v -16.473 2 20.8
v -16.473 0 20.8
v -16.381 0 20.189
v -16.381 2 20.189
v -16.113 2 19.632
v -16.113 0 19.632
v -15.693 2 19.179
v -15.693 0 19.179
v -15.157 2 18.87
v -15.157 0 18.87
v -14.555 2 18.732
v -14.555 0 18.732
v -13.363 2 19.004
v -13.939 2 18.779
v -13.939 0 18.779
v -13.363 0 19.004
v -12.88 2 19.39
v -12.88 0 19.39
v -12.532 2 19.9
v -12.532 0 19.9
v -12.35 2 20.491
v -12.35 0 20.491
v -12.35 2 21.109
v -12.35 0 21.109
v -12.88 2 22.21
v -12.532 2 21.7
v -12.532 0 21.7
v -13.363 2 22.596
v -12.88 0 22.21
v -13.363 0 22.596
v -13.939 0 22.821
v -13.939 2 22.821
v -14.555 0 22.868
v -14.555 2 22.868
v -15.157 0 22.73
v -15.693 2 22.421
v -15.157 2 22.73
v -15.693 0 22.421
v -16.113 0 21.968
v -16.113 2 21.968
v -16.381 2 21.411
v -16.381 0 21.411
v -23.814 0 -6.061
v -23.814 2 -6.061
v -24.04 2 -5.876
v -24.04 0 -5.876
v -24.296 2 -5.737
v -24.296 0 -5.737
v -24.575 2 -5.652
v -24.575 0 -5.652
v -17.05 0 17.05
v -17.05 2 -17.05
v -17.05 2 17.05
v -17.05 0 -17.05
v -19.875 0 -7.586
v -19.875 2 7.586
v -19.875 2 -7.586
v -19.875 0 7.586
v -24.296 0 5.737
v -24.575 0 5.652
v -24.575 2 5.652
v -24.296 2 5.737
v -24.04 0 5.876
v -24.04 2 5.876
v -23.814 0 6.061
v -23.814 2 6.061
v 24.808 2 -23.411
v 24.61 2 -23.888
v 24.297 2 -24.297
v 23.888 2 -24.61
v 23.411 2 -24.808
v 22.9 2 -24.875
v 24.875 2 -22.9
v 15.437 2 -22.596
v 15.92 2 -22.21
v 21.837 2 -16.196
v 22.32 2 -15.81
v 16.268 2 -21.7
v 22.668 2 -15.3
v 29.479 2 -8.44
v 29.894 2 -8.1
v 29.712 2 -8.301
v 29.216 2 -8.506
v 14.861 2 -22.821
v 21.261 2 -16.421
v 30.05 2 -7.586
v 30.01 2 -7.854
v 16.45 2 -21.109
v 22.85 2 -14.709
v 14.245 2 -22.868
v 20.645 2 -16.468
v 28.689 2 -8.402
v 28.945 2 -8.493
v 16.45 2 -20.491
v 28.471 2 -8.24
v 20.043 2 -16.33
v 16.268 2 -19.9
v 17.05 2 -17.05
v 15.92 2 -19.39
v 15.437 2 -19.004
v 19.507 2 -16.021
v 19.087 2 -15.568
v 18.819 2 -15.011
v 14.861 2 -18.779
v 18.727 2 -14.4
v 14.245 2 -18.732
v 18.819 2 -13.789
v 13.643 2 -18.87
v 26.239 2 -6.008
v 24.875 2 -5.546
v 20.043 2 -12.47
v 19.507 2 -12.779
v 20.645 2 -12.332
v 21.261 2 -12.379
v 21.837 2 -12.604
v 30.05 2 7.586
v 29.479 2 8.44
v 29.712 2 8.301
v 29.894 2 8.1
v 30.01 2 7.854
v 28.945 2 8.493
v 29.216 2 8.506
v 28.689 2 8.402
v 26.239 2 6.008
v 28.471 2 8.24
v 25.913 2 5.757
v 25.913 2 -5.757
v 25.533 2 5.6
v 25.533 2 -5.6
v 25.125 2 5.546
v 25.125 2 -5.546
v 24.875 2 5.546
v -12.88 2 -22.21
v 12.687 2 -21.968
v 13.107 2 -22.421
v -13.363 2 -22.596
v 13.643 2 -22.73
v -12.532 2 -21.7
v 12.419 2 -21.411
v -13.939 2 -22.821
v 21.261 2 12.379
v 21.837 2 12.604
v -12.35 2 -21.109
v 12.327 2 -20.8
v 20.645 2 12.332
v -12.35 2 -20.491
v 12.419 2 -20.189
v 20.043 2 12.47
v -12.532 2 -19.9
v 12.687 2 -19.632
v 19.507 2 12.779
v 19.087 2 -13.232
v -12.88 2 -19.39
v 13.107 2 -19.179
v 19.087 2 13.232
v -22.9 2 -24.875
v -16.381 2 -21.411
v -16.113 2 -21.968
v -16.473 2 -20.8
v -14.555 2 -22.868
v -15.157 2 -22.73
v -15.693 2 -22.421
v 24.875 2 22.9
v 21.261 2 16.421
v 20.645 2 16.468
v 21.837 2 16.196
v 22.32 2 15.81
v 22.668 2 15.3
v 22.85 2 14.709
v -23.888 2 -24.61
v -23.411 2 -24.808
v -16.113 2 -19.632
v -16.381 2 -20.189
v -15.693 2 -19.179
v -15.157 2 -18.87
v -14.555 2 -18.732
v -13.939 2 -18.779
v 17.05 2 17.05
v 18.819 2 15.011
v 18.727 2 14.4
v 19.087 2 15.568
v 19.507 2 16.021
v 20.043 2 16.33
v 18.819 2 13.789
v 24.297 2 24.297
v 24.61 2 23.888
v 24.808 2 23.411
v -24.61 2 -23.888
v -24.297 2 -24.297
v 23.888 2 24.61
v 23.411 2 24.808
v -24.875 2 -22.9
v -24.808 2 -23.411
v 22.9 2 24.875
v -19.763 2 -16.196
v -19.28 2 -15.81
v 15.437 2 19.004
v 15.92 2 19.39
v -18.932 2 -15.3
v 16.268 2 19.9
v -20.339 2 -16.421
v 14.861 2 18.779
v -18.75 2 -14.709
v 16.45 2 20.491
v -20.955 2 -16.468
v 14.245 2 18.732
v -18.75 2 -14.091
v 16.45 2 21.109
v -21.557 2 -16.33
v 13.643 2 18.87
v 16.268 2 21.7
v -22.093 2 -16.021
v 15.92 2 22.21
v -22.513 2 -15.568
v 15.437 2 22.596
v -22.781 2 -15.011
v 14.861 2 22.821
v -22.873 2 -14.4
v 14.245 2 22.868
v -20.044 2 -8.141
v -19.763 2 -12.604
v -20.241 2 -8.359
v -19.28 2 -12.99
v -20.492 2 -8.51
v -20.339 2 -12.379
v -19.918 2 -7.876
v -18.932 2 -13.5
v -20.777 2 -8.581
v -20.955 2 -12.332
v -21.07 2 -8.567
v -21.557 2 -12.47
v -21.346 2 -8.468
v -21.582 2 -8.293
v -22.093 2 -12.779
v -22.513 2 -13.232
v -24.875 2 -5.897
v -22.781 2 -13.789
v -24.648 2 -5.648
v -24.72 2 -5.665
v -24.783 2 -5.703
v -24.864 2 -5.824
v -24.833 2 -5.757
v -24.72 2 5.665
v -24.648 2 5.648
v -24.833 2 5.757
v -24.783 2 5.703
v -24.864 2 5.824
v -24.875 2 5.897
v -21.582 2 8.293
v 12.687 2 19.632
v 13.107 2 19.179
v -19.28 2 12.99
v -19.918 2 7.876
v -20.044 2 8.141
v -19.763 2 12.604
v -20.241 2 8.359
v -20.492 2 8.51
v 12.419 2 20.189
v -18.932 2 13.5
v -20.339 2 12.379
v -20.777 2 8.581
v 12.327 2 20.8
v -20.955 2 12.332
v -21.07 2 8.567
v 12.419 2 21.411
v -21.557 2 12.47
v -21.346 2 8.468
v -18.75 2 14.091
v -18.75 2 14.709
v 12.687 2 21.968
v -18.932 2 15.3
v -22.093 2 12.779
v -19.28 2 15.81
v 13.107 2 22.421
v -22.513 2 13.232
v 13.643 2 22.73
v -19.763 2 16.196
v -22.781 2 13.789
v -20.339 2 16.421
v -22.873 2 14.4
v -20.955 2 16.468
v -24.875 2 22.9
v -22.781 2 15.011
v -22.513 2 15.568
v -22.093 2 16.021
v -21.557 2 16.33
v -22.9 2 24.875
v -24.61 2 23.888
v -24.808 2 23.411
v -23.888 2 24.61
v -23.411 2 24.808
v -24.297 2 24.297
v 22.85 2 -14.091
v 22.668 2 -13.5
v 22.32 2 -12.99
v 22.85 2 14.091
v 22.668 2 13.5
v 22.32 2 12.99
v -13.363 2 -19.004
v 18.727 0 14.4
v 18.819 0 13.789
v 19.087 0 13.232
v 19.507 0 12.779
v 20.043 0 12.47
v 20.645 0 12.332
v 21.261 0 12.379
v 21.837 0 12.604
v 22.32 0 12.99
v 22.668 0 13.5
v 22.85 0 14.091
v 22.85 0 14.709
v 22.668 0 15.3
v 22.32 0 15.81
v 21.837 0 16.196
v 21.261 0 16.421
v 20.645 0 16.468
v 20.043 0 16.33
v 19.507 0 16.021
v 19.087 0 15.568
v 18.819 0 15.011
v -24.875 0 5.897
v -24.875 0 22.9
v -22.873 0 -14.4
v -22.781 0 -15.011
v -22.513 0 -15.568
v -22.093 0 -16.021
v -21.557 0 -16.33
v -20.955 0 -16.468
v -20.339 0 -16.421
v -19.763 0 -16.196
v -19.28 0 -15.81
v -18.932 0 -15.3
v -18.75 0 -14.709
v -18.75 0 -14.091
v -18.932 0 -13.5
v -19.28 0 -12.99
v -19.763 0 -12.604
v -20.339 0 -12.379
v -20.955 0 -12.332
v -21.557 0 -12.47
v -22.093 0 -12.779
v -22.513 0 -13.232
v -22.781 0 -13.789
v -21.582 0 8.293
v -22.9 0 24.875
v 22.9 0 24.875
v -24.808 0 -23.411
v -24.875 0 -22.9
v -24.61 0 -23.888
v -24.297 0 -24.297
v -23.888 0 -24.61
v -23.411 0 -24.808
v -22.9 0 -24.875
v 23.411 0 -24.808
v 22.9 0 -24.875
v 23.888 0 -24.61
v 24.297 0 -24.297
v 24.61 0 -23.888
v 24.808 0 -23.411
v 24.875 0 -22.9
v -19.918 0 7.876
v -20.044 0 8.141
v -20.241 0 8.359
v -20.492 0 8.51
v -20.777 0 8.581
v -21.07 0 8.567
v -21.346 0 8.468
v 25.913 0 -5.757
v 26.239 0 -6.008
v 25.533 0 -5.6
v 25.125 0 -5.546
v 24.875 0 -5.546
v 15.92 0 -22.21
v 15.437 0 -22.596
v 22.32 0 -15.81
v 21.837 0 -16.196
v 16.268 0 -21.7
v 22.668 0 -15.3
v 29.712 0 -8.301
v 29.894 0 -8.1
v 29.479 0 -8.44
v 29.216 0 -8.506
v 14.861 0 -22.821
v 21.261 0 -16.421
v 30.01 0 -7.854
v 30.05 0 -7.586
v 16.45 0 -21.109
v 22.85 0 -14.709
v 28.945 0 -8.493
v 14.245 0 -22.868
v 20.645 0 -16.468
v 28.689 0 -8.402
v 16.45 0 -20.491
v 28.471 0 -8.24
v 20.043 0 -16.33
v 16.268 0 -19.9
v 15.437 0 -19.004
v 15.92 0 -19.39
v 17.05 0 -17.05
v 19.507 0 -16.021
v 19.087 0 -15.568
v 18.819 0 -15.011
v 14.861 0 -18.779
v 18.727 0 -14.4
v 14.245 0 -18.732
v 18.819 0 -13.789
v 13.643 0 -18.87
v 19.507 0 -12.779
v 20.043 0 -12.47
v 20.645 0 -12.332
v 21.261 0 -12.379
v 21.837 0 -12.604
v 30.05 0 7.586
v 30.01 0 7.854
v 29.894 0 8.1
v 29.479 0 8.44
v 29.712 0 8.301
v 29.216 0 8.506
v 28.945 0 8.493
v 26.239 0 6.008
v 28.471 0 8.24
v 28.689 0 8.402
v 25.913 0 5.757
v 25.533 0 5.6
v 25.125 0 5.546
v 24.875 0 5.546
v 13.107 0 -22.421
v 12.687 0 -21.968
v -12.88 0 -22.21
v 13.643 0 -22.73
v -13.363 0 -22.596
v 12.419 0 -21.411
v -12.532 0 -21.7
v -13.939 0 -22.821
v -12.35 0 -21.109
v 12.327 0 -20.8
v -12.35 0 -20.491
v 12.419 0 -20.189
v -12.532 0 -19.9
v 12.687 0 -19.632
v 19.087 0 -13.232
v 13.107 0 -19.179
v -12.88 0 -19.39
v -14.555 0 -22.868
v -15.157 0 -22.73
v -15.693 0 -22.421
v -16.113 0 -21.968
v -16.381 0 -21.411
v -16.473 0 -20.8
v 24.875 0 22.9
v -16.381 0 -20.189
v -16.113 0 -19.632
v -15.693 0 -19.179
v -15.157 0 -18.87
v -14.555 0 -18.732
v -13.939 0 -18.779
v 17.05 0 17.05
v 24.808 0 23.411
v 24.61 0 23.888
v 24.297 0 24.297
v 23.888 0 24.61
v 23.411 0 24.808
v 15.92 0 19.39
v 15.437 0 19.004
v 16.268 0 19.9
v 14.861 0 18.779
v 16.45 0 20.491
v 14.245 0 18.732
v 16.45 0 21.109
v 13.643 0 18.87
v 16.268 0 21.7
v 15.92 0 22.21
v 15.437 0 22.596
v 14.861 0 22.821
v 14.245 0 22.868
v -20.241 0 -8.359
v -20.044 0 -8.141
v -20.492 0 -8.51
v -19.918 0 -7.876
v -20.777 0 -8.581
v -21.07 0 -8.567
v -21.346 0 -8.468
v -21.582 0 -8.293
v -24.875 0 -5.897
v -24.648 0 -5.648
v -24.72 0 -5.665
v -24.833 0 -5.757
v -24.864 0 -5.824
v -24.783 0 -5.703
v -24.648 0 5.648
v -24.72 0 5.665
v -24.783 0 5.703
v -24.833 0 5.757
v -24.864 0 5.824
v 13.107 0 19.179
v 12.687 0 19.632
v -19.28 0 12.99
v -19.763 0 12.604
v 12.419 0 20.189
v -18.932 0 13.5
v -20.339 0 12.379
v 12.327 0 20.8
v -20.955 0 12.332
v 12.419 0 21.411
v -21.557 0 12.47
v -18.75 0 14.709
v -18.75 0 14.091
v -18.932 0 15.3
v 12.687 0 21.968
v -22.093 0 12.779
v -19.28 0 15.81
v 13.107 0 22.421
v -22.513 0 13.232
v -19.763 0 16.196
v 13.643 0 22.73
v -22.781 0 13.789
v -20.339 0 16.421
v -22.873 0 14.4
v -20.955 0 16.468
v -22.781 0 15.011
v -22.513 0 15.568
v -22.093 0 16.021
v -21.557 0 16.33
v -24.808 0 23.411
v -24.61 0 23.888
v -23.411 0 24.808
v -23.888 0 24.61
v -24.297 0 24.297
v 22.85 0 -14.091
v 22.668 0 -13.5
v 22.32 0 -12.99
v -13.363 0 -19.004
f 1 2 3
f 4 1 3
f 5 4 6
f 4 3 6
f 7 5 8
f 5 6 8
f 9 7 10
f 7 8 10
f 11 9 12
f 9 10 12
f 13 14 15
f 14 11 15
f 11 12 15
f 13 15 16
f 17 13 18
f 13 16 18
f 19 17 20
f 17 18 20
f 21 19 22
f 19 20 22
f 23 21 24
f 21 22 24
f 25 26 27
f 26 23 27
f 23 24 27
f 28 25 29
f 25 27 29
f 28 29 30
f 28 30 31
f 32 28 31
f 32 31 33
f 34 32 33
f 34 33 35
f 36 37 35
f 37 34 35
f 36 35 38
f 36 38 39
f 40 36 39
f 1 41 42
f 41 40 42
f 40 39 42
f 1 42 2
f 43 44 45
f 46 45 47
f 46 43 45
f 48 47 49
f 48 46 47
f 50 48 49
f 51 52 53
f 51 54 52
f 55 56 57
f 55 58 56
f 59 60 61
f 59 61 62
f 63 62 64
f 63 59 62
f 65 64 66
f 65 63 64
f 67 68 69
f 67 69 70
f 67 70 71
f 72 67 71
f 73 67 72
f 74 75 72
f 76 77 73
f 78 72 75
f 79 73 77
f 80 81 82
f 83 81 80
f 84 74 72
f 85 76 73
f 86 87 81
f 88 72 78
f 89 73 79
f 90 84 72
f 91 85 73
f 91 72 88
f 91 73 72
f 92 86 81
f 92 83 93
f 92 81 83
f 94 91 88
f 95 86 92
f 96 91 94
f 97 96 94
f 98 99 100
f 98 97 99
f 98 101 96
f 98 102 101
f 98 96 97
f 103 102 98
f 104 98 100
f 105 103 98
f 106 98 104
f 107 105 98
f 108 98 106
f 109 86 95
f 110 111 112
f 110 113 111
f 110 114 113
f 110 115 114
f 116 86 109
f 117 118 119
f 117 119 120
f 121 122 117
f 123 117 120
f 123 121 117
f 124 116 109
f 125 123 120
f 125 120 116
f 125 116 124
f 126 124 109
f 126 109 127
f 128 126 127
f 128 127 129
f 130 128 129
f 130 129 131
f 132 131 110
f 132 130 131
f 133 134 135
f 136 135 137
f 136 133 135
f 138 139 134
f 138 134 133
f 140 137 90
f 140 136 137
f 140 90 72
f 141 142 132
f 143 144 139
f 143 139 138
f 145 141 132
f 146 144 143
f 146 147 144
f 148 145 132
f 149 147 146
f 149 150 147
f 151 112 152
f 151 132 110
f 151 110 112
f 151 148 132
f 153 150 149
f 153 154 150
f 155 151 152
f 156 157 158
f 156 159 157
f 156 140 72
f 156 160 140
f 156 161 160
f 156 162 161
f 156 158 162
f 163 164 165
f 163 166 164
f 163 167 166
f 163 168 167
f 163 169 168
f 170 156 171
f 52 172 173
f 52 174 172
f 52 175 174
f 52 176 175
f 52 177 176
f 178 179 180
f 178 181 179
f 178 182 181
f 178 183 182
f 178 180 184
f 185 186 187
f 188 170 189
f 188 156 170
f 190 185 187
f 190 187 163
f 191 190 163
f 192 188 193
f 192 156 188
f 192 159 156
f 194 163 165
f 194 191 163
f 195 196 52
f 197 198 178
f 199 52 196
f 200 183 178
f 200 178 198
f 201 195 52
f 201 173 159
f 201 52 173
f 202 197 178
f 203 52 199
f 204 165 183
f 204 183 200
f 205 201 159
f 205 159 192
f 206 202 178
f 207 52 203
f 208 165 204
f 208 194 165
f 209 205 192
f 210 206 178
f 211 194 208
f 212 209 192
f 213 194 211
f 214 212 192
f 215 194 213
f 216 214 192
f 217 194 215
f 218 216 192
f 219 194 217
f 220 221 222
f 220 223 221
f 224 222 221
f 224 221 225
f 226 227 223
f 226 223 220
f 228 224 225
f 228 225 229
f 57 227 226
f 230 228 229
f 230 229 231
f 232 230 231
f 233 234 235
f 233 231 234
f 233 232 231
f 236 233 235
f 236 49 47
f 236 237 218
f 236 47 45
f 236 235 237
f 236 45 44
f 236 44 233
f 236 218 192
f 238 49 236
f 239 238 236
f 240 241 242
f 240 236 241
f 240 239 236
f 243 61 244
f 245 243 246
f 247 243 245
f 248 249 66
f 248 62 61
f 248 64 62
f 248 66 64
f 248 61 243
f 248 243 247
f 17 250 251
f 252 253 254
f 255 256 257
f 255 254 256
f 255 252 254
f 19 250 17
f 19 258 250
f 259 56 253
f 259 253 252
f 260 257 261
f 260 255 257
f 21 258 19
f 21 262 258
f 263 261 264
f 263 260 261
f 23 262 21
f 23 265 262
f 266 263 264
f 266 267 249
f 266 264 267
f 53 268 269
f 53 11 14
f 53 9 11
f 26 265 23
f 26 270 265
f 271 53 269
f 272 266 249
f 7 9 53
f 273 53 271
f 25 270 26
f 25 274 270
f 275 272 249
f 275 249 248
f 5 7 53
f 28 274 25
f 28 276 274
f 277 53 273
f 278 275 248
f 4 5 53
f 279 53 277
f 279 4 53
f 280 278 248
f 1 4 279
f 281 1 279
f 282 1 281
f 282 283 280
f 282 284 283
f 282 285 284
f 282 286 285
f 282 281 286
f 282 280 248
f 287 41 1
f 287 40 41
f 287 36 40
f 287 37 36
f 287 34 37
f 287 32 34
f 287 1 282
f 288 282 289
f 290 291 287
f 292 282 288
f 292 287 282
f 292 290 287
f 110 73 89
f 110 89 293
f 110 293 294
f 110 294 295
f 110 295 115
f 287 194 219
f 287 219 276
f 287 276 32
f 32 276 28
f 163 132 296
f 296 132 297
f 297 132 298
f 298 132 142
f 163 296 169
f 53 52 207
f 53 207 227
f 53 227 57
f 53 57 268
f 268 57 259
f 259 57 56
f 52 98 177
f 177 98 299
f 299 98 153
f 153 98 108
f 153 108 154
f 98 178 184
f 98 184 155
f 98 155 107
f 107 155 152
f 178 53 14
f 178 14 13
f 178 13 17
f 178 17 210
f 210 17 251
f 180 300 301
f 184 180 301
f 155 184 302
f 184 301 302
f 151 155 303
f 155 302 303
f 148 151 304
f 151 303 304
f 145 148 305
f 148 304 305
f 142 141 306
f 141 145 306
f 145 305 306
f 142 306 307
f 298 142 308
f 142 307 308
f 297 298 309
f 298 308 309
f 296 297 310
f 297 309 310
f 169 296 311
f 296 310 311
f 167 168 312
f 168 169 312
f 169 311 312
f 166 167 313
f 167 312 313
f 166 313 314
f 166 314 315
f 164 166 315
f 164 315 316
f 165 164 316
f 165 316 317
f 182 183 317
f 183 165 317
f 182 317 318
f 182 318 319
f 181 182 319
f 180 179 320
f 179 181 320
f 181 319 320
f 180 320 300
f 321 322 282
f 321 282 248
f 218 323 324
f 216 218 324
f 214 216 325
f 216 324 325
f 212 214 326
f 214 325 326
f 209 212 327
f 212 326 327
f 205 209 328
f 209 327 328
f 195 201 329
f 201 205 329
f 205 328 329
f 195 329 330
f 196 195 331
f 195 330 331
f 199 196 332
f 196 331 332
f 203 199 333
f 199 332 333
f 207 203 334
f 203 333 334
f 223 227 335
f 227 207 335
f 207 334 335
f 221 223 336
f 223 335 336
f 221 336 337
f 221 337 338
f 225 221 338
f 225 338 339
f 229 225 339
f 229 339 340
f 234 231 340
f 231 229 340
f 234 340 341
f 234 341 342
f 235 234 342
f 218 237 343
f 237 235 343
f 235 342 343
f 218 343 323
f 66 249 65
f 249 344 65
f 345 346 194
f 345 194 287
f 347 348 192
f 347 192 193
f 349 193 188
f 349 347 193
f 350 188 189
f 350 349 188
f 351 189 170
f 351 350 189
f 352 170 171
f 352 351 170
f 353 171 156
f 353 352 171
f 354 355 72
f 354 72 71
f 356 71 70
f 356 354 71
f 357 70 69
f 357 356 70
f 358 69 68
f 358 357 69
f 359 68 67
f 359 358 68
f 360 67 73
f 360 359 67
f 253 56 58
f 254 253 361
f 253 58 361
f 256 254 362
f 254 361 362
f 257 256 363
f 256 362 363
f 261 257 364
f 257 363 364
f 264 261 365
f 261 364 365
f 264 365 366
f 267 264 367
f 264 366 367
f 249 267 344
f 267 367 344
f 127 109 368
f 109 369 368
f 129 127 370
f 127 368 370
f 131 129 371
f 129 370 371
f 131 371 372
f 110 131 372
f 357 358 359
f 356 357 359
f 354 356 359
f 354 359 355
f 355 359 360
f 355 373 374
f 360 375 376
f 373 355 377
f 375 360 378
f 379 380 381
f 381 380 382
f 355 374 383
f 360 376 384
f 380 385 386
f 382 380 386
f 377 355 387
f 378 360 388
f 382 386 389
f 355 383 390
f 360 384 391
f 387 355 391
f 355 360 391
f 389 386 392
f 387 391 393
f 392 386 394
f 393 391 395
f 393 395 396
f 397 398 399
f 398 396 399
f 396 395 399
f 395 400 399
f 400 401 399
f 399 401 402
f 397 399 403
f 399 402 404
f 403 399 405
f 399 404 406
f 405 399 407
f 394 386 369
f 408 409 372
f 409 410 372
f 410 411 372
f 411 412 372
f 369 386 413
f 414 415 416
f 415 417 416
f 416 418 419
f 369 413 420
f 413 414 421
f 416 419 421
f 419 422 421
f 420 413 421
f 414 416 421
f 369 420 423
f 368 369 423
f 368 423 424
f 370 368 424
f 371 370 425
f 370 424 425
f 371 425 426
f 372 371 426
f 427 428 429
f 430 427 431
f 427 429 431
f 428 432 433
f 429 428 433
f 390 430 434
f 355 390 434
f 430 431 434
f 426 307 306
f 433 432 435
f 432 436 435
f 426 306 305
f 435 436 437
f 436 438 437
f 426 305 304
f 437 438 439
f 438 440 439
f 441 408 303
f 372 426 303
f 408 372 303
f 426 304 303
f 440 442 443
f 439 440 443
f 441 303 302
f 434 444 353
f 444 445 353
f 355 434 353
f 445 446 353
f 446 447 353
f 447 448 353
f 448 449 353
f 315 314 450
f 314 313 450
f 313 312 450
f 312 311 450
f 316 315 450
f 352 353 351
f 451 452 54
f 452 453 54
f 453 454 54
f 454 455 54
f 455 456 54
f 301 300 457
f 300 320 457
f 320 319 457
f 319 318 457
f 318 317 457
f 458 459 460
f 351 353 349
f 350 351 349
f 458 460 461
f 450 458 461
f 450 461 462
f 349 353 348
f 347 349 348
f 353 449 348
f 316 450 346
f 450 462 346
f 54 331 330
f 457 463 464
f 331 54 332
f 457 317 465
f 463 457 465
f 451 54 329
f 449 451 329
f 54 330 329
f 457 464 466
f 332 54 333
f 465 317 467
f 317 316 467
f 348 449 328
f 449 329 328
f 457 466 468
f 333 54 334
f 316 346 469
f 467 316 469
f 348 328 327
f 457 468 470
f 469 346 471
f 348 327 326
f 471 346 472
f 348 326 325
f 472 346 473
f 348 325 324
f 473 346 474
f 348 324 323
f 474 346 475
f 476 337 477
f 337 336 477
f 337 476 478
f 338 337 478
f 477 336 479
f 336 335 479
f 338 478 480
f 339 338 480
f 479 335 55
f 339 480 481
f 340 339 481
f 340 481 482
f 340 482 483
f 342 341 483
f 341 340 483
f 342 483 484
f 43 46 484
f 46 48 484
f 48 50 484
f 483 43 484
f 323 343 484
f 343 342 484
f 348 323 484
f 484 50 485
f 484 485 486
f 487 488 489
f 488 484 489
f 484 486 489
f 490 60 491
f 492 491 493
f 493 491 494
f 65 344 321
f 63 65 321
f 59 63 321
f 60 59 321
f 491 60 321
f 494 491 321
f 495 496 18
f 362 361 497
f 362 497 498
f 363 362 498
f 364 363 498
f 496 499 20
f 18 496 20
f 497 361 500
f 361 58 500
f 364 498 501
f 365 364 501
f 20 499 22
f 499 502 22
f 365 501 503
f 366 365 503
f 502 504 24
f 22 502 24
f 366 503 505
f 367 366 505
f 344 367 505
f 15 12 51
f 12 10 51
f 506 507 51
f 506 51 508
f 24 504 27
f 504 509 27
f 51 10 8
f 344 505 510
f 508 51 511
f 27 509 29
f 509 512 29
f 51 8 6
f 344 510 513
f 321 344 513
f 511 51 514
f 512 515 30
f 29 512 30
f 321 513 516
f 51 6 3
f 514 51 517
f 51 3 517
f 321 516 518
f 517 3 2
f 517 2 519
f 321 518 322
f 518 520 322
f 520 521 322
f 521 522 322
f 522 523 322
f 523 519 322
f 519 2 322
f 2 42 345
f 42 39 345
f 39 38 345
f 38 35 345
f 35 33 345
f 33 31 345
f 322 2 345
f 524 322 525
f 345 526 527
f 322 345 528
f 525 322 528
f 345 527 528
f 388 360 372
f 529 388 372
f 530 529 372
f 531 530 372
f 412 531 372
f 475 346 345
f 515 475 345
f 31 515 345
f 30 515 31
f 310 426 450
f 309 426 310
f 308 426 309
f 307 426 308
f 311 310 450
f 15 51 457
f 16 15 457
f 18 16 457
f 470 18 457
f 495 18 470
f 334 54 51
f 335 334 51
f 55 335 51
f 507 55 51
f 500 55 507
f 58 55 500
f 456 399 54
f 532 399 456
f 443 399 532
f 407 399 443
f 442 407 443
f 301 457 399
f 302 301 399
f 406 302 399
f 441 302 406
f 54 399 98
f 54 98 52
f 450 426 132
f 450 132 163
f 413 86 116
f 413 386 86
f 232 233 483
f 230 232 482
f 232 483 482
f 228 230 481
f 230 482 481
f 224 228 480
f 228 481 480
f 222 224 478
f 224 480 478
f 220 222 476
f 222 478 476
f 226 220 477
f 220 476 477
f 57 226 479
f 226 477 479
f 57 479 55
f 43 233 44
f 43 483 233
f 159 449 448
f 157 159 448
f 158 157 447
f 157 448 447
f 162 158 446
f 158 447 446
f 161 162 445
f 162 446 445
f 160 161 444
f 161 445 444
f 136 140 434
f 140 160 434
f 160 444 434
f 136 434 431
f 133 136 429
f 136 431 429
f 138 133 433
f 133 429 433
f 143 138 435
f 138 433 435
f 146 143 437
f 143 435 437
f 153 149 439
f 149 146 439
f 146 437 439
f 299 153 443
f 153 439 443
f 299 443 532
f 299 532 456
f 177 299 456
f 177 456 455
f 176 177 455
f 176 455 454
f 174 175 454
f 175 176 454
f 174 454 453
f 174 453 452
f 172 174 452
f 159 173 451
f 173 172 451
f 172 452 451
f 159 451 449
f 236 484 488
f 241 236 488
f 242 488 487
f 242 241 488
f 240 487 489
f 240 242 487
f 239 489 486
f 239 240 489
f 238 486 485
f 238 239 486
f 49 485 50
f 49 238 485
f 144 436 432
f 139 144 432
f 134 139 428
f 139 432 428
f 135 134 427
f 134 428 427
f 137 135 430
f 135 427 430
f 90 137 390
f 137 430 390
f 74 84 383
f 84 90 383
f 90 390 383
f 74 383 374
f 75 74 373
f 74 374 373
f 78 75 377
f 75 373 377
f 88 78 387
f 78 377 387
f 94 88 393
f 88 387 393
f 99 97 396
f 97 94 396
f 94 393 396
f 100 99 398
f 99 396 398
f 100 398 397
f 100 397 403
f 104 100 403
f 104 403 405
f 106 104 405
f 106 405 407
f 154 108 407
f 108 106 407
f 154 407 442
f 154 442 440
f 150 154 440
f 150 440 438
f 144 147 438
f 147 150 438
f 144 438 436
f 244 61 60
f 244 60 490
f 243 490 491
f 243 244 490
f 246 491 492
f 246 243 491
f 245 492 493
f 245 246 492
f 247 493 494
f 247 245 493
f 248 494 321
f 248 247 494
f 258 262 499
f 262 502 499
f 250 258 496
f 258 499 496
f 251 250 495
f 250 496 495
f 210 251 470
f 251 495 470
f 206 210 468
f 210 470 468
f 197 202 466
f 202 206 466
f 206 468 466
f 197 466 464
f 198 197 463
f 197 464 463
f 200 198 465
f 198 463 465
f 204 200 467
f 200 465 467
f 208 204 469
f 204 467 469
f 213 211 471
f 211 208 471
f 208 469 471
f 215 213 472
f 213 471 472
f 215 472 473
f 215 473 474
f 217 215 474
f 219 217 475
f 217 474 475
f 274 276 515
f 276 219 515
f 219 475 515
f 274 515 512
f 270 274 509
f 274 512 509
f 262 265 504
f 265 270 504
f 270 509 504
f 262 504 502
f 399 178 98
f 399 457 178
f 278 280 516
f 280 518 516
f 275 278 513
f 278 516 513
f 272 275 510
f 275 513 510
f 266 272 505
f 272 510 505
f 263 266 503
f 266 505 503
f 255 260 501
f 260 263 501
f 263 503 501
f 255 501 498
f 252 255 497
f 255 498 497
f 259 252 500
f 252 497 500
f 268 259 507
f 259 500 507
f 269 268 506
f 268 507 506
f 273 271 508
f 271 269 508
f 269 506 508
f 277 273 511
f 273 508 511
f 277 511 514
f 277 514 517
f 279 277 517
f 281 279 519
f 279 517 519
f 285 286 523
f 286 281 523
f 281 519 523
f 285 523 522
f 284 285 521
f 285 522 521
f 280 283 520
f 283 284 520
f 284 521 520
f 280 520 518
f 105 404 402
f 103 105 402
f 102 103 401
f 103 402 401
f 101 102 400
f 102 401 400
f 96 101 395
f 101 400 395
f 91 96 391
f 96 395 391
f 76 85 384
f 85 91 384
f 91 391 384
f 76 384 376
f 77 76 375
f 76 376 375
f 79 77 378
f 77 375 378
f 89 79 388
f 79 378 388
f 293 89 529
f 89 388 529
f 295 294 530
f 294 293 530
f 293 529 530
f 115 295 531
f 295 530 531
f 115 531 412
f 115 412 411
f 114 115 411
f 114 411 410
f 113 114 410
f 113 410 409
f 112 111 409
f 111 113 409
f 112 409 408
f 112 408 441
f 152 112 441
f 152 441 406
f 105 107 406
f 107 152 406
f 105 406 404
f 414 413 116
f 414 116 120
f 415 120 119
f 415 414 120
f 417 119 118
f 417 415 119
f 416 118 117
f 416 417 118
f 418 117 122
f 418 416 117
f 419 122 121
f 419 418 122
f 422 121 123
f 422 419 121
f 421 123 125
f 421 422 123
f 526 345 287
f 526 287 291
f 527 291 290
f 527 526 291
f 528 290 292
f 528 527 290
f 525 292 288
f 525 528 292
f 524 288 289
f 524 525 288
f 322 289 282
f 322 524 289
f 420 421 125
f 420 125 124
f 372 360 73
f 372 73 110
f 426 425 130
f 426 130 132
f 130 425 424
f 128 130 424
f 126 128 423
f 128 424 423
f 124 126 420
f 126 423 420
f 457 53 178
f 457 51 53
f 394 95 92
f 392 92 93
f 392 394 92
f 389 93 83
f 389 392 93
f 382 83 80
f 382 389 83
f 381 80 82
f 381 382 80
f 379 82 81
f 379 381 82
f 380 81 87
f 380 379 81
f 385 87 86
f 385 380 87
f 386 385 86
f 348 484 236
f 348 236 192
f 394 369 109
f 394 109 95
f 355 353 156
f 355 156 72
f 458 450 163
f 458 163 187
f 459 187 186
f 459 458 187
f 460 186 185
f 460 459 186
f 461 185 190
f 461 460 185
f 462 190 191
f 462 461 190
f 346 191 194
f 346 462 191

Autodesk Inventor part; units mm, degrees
ref_plane "YZ Plane" through (0, 0, 0) normal (1, 0, 0) x (0, 1, 0)
ref_plane "XZ Plane" through (0, 0, 0) normal (0, 1, 0) x (-1, 0, 0)
ref_plane "XY Plane" through (0, 0, 0) normal (0, 0, 1) x (1, 0, 0)
sketch "Sketch1" plane through (0, 0, 0) normal (0, 1, 0) x (-1, 0, 0)
  circle A0 centre (-21.9, -21.9) radius 1.875 projected
  circle A1 centre (21.9, 21.9) radius 1.875 projected
  circle A2 centre (21.9, -21.9) radius 1.875 projected
  circle A3 centre (-21.9, 21.9) radius 1.875 projected
  circle A4 centre (14.4, 20.8) radius 2.0734 projected
  circle A5 centre (-14.4, -20.8) radius 2.0734 projected
  circle A6 centre (14.4, -20.8) radius 2.0734 projected
  circle A7 centre (20.8, -14.4) radius 2.0734 projected
  line L0 (-17.05, 17.05) -> (-17.05, -17.05) projected
  line L1 (17.05, 17.05) -> (-17.05, 17.05) projected
  line L2 (17.05, -17.05) -> (17.05, 17.05) projected
  line L3 (-17.05, -17.05) -> (17.05, -17.05) projected
  circle A8 centre (20.8, 14.4) radius 2.0734 projected
  circle A9 centre (-14.4, 20.8) radius 2.0734 projected
  circle A10 centre (-20.8, -14.4) radius 2.0734 projected
  circle A11 centre (-20.8, 14.4) radius 2.0734 projected
  line L4 (-22.9, 24.875) -> (22.9, 24.875) projected
  arc A12 (-22.9, 24.875) -> (-24.875, 22.9) centre (-22.9, 22.9) ccw projected
  line L5 (-24.875, -22.9) -> (-24.875, 22.9) projected
  arc A13 (-24.875, -22.9) -> (-22.9, -24.875) centre (-22.9, -22.9) ccw projected
  line L6 (22.9, -24.875) -> (-22.9, -24.875) projected
  arc A14 (22.9, -24.875) -> (24.875, -22.9) centre (22.9, -22.9) ccw projected
  line L7 (24.875, 22.9) -> (24.875, -22.9) projected
  arc A15 (24.875, 22.9) -> (22.9, 24.875) centre (22.9, 22.9) ccw projected
  arc A16 (24.9, 22.9) -> (22.9, 24.9) centre (22.9, 22.9) ccw projected
  line L8 (22.9, 24.9) -> (-22.9, 24.9) projected
  arc A17 (-22.9, 24.9) -> (-24.9, 22.9) centre (-22.9, 22.9) ccw projected
  line L9 (-24.9, 22.9) -> (-24.9, -22.9) projected
  arc A18 (-24.9, -22.9) -> (-22.9, -24.9) centre (-22.9, -22.9) ccw projected
  line L10 (-22.9, -24.9) -> (22.9, -24.9) projected
  arc A19 (22.9, -24.9) -> (24.9, -22.9) centre (22.9, -22.9) ccw projected
  line L11 (24.9, -22.9) -> (24.9, 22.9) projected
  point P0 (0, 0)
extrude "Extrusion1" add sketch "Sketch1" along normal blind 2 contours A0 | A1 | A2 | A3 | L4 A15 L7 A14 L6 A13 L5 A12
sketch "Sketch2" plane through (0, 0, 0) normal (0, 1, 0) x (-1, 0, 0)
  line L0 (-7.5858, -29.875) -> (7.5858, -29.875)
  line L1 (10, -29.875) -> (10, -19.875)
  line L2 (7.5858, -19.875) -> (-7.5858, -19.875)
  line L3 (-10, -19.875) -> (-10, -29.875)
  line L4 (-10, -29.875) -> (10, -19.875) construction
  line L5 (10, -29.875) -> (-10, -19.875) construction
  line L6 (-8.2929, -21.5821) -> (-6.0607, -23.8143)
  line L7 (-10, -19.875) -> (-6.8431, -19.875) construction
  line L8 (8.2929, -21.5821) -> (6.0607, -23.8143)
  line L9 (-8.2929, -28.1679) -> (-6.0607, -25.9357)
  line L10 (8.2929, -28.1679) -> (6.0607, -25.9357)
  arc A0 (-8.2929, -28.1679) -> (-7.5858, -29.875) centre (-7.5858, -28.875) ccw
  arc A1 (7.5858, -29.875) -> (8.2929, -28.1679) centre (7.5858, -28.875) ccw
  arc A2 (-6.0607, -25.9357) -> (-6.0607, -23.8143) centre (-7.1213, -24.875) ccw
  arc A3 (6.0607, -23.8143) -> (6.0607, -25.9357) centre (7.1213, -24.875) ccw
  arc A4 (-7.5858, -19.875) -> (-8.2929, -21.5821) centre (-7.5858, -20.875) ccw
  arc A5 (8.2929, -21.5821) -> (7.5858, -19.875) centre (7.5858, -20.875) ccw
  line L11 (-7.5858, -19.95) -> (7.5858, -19.95)
  arc A6 (8.2399, -21.5291) -> (7.5858, -19.95) centre (7.5858, -20.875) ccw
  line L12 (8.2399, -21.5291) -> (6.0076, -23.7613)
  arc A7 (6.0076, -23.7613) -> (6.0076, -25.9887) centre (7.1213, -24.875) ccw
  line L13 (6.0076, -25.9887) -> (8.2399, -28.2209)
  arc A8 (7.5858, -29.8) -> (8.2399, -28.2209) centre (7.5858, -28.875) ccw
  line L14 (7.5858, -29.8) -> (-7.5858, -29.8)
  arc A9 (-8.2399, -28.2209) -> (-7.5858, -29.8) centre (-7.5858, -28.875) ccw
  line L15 (-8.2399, -28.2209) -> (-6.0076, -25.9887)
  arc A10 (-6.0076, -25.9887) -> (-6.0076, -23.7613) centre (-7.1213, -24.875) ccw
  line L16 (-6.0076, -23.7613) -> (-8.2399, -21.5291)
  arc A11 (-7.5858, -19.95) -> (-8.2399, -21.5291) centre (-7.5858, -20.875) ccw
  line L17 (-8.2399, 21.7791) -> (-6.0076, 24.0113)
  line L18 (-7.5858, 30.05) -> (7.5858, 30.05)
  line L19 (7.5858, 20.2) -> (-7.5858, 20.2)
  line L20 (-7.5858, 20.125) -> (7.5858, 20.125)
  line L21 (7.5858, 30.125) -> (-7.5858, 30.125)
  line L22 (10, 20.125) -> (-10, 30.125) construction
  line L23 (-10, 20.125) -> (10, 30.125) construction
  arc A12 (-6.0076, 24.0113) -> (-6.0076, 26.2387) centre (-7.1213, 25.125) ccw
  arc A13 (-6.0607, 24.0643) -> (-6.0607, 26.1857) centre (-7.1213, 25.125) ccw
  arc A14 (-7.5858, 30.05) -> (-8.2399, 28.4709) centre (-7.5858, 29.125) ccw
  arc A15 (-7.5858, 30.125) -> (-8.2929, 28.4179) centre (-7.5858, 29.125) ccw
  line L24 (-8.2929, 28.4179) -> (-6.0607, 26.1857)
  line L25 (-10, 30.125) -> (-6.8431, 30.125) construction
  line L26 (-10, 30.125) -> (-10, 20.125)
  arc A16 (-8.2399, 21.7791) -> (-7.5858, 20.2) centre (-7.5858, 21.125) ccw
  arc A17 (-8.2929, 21.8321) -> (-7.5858, 20.125) centre (-7.5858, 21.125) ccw
  line L27 (-8.2929, 21.8321) -> (-6.0607, 24.0643)
  line L28 (-6.0076, 26.2387) -> (-8.2399, 28.4709)
  line L29 (10, 20.125) -> (10, 30.125)
  line L30 (8.2929, 28.4179) -> (6.0607, 26.1857)
  line L31 (8.2929, 21.8321) -> (6.0607, 24.0643)
  arc A18 (7.5858, 20.125) -> (8.2929, 21.8321) centre (7.5858, 21.125) ccw
  arc A19 (6.0076, 26.2387) -> (6.0076, 24.0113) centre (7.1213, 25.125) ccw
  arc A20 (6.0607, 26.1857) -> (6.0607, 24.0643) centre (7.1213, 25.125) ccw
  arc A21 (7.5858, 20.2) -> (8.2399, 21.7791) centre (7.5858, 21.125) ccw
  line L32 (6.0076, 24.0113) -> (8.2399, 21.7791)
  line L33 (8.2399, 28.4709) -> (6.0076, 26.2387)
  arc A22 (8.2929, 28.4179) -> (7.5858, 30.125) centre (7.5858, 29.125) ccw
  arc A23 (8.2399, 28.4709) -> (7.5858, 30.05) centre (7.5858, 29.125) ccw
  line L34 (0, 24.875) -> (0, 25.125)
  line L35 (-22.9, -24.875) -> (22.9, -24.875) projected
  line L36 (22.9, 24.875) -> (-22.9, 24.875) projected
  line L37 (0, -24.875) -> (0, -24.875)
  line L38 (5.6213, 25.125) -> (5.5463, 25.125)
  line L39 (5.5463, 25.125) -> (5.5463, 24.875)
  line L40 (5.5463, 24.875) -> (5.6213, 24.875)
  line L41 (5.6213, 24.875) -> (5.6213, 25.125)
  line L42 (-5.6213, 25.125) -> (-5.5463, 25.125)
  line L43 (-5.5463, 25.125) -> (-5.5463, 24.875)
  line L44 (-5.5463, 24.875) -> (-5.6213, 24.875)
  line L45 (-5.6213, 24.875) -> (-5.6213, 25.125)
  line L46 (-5.6213, -24.875) -> (-5.5463, -24.875)
  line L47 (-5.5463, -24.875) -> (-5.5463, -24.875)
  line L48 (-5.5463, -24.875) -> (-5.6213, -24.875)
  line L49 (-5.6213, -24.875) -> (-5.6213, -24.875)
  line L50 (5.6213, -24.875) -> (5.5463, -24.875)
  line L51 (5.5463, -24.875) -> (5.5463, -24.875)
  line L52 (5.5463, -24.875) -> (5.6213, -24.875)
  line L53 (5.6213, -24.875) -> (5.6213, -24.875)
  arc A24 (19.95, -7.5858) -> (21.5291, -8.2399) centre (20.875, -7.5858) ccw
  arc A25 (19.875, -7.5858) -> (21.5821, -8.2929) centre (20.875, -7.5858) ccw
  line L54 (21.5821, -8.2929) -> (23.8143, -6.0607)
  line L55 (23.7613, -6.0076) -> (21.5291, -8.2399)
  arc A26 (25.9357, -6.0607) -> (23.8143, -6.0607) centre (24.875, -7.1213) ccw
  arc A27 (25.9887, -6.0076) -> (23.7613, -6.0076) centre (24.875, -7.1213) ccw
  line L56 (29.875, -7.5858) -> (29.875, 7.5858)
  line L57 (29.8, 7.5858) -> (29.8, -7.5858)
  line L58 (19.95, -7.5858) -> (19.95, 7.5858)
  line L59 (19.875, 7.5858) -> (19.875, -7.5858)
  line L60 (28.2209, -8.2399) -> (25.9887, -6.0076)
  line L61 (21.5821, 8.2929) -> (23.8143, 6.0607)
  line L62 (28.1679, 8.2929) -> (25.9357, 6.0607)
  arc A28 (29.875, 7.5858) -> (28.1679, 8.2929) centre (28.875, 7.5858) ccw
  arc A29 (23.7613, 6.0076) -> (25.9887, 6.0076) centre (24.875, 7.1213) ccw
  line L63 (24.875, 5.5463) -> (24.875, 5.5463)
  line L64 (24.875, 5.6213) -> (24.875, 5.5463)
  line L65 (24.875, 5.5463) -> (24.875, 5.6213)
  line L66 (24.875, 5.6213) -> (24.875, 5.6213)
  arc A30 (23.8143, 6.0607) -> (25.9357, 6.0607) centre (24.875, 7.1213) ccw
  line L67 (25.9887, 6.0076) -> (28.2209, 8.2399)
  arc A31 (29.8, 7.5858) -> (28.2209, 8.2399) centre (28.875, 7.5858) ccw
  line L68 (21.5291, 8.2399) -> (23.7613, 6.0076)
  arc A32 (21.5291, 8.2399) -> (19.95, 7.5858) centre (20.875, 7.5858) ccw
  arc A33 (21.5821, 8.2929) -> (19.875, 7.5858) centre (20.875, 7.5858) ccw
  line L69 (24.875, -5.5463) -> (24.875, -5.5463)
  line L70 (24.875, -5.5463) -> (24.875, -5.6213)
  line L71 (24.875, -5.6213) -> (24.875, -5.5463)
  line L72 (24.875, -5.6213) -> (24.875, -5.6213)
  line L73 (24.875, 0) -> (24.875, 0)
  line L74 (28.1679, -8.2929) -> (25.9357, -6.0607)
  arc A34 (28.1679, -8.2929) -> (29.875, -7.5858) centre (28.875, -7.5858) ccw
  arc A35 (28.2209, -8.2399) -> (29.8, -7.5858) centre (28.875, -7.5858) ccw
  line L75 (-25.125, 5.6213) -> (-25.125, 5.5463)
  arc A36 (-28.4709, 8.2399) -> (-30.05, 7.5858) centre (-29.125, 7.5858) ccw
  arc A37 (-28.4179, 8.2929) -> (-30.125, 7.5858) centre (-29.125, 7.5858) ccw
  line L76 (-28.4179, 8.2929) -> (-26.1857, 6.0607)
  line L77 (-24.875, 5.5463) -> (-24.875, 5.6213)
  arc A38 (-26.2387, 6.0076) -> (-24.0113, 6.0076) centre (-25.125, 7.1213) ccw
  line L78 (-21.8321, 8.2929) -> (-24.0643, 6.0607)
  line L79 (-24.875, 0) -> (-25.125, 0)
  arc A39 (-20.2, 7.5858) -> (-21.7791, 8.2399) centre (-21.125, 7.5858) ccw
  arc A40 (-20.125, 7.5858) -> (-21.8321, 8.2929) centre (-21.125, 7.5858) ccw
  line L80 (-30.05, -7.5858) -> (-30.05, 7.5858)
  line L81 (-30.125, 7.5858) -> (-30.125, -7.5858)
  line L82 (-20.2, 7.5858) -> (-20.2, -7.5858)
  line L83 (-20.125, -7.5858) -> (-20.125, 7.5858)
  line L84 (-24.875, 5.6213) -> (-25.125, 5.6213)
  arc A41 (-26.1857, 6.0607) -> (-24.0643, 6.0607) centre (-25.125, 7.1213) ccw
  line L85 (-24.0113, 6.0076) -> (-21.7791, 8.2399)
  line L86 (-25.125, 5.5463) -> (-24.875, 5.5463)
  line L87 (-28.4709, 8.2399) -> (-26.2387, 6.0076)
  line L88 (-25.125, -5.5463) -> (-24.875, -5.5463)
  line L89 (-24.875, -5.5463) -> (-24.875, -5.6213)
  line L90 (-24.875, -5.6213) -> (-25.125, -5.6213)
  line L91 (-25.125, -5.6213) -> (-25.125, -5.5463)
  arc A42 (-30.05, -7.5858) -> (-28.4709, -8.2399) centre (-29.125, -7.5858) ccw
  arc A43 (-21.8321, -8.2929) -> (-20.125, -7.5858) centre (-21.125, -7.5858) ccw
  arc A44 (-21.7791, -8.2399) -> (-20.2, -7.5858) centre (-21.125, -7.5858) ccw
  arc A45 (-24.0113, -6.0076) -> (-26.2387, -6.0076) centre (-25.125, -7.1213) ccw
  arc A46 (-24.0643, -6.0607) -> (-26.1857, -6.0607) centre (-25.125, -7.1213) ccw
  line L92 (-21.7791, -8.2399) -> (-24.0113, -6.0076)
  line L93 (-21.8321, -8.2929) -> (-24.0643, -6.0607)
  line L94 (-28.4179, -8.2929) -> (-26.1857, -6.0607)
  line L95 (-26.2387, -6.0076) -> (-28.4709, -8.2399)
  arc A47 (-30.125, -7.5858) -> (-28.4179, -8.2929) centre (-29.125, -7.5858) ccw
  arc A48 (7.5858, 19.95) -> (8.2399, 21.5291) centre (7.5858, 20.875) ccw
  arc A49 (7.5858, 19.875) -> (8.2929, 21.5821) centre (7.5858, 20.875) ccw
  line L96 (8.2929, 21.5821) -> (6.0607, 23.8143)
  line L97 (6.0076, 23.7613) -> (8.2399, 21.5291)
  arc A50 (6.0607, 25.9357) -> (6.0607, 23.8143) centre (7.1213, 24.875) ccw
  arc A51 (6.0076, 25.9887) -> (6.0076, 23.7613) centre (7.1213, 24.875) ccw
  line L98 (7.5858, 29.875) -> (-7.5858, 29.875)
  line L99 (-7.5858, 29.8) -> (7.5858, 29.8)
  line L100 (7.5858, 19.95) -> (-7.5858, 19.95)
  line L101 (-7.5858, 19.875) -> (7.5858, 19.875)
  line L102 (8.2399, 28.2209) -> (6.0076, 25.9887)
  line L103 (-8.2929, 21.5821) -> (-6.0607, 23.8143)
  line L104 (-8.2929, 28.1679) -> (-6.0607, 25.9357)
  arc A52 (-7.5858, 29.875) -> (-8.2929, 28.1679) centre (-7.5858, 28.875) ccw
  arc A53 (-6.0076, 23.7613) -> (-6.0076, 25.9887) centre (-7.1213, 24.875) ccw
  line L105 (-5.5463, 24.875) -> (-5.5463, 24.875)
  line L106 (-5.6213, 24.875) -> (-5.5463, 24.875)
  line L107 (-5.5463, 24.875) -> (-5.6213, 24.875)
  line L108 (-5.6213, 24.875) -> (-5.6213, 24.875)
  arc A54 (-6.0607, 23.8143) -> (-6.0607, 25.9357) centre (-7.1213, 24.875) ccw
  line L109 (-6.0076, 25.9887) -> (-8.2399, 28.2209)
  arc A55 (-7.5858, 29.8) -> (-8.2399, 28.2209) centre (-7.5858, 28.875) ccw
  line L110 (-8.2399, 21.5291) -> (-6.0076, 23.7613)
  arc A56 (-8.2399, 21.5291) -> (-7.5858, 19.95) centre (-7.5858, 20.875) ccw
  arc A57 (-8.2929, 21.5821) -> (-7.5858, 19.875) centre (-7.5858, 20.875) ccw
  line L111 (5.5463, 24.875) -> (5.5463, 24.875)
  line L112 (5.5463, 24.875) -> (5.6213, 24.875)
  line L113 (5.6213, 24.875) -> (5.5463, 24.875)
  line L114 (5.6213, 24.875) -> (5.6213, 24.875)
  line L115 (0, 24.875) -> (0, 24.875)
  line L116 (8.2929, 28.1679) -> (6.0607, 25.9357)
  arc A58 (8.2929, 28.1679) -> (7.5858, 29.875) centre (7.5858, 28.875) ccw
  arc A59 (8.2399, 28.2209) -> (7.5858, 29.8) centre (7.5858, 28.875) ccw
  line L117 (-5.6213, -25.125) -> (-5.5463, -25.125)
  arc A60 (-8.2399, -28.4709) -> (-7.5858, -30.05) centre (-7.5858, -29.125) ccw
  arc A61 (-8.2929, -28.4179) -> (-7.5858, -30.125) centre (-7.5858, -29.125) ccw
  line L118 (-8.2929, -28.4179) -> (-6.0607, -26.1857)
  line L119 (-5.5463, -24.875) -> (-5.6213, -24.875)
  arc A62 (-6.0076, -26.2387) -> (-6.0076, -24.0113) centre (-7.1213, -25.125) ccw
  line L120 (-8.2929, -21.8321) -> (-6.0607, -24.0643)
  line L121 (0, -24.875) -> (0, -25.125)
  arc A63 (-7.5858, -20.2) -> (-8.2399, -21.7791) centre (-7.5858, -21.125) ccw
  arc A64 (-7.5858, -20.125) -> (-8.2929, -21.8321) centre (-7.5858, -21.125) ccw
  line L122 (7.5858, -30.05) -> (-7.5858, -30.05)
  line L123 (-7.5858, -30.125) -> (7.5858, -30.125)
  line L124 (-7.5858, -20.2) -> (7.5858, -20.2)
  line L125 (7.5858, -20.125) -> (-7.5858, -20.125)
  line L126 (-5.6213, -24.875) -> (-5.6213, -25.125)
  arc A65 (-6.0607, -26.1857) -> (-6.0607, -24.0643) centre (-7.1213, -25.125) ccw
  line L127 (-6.0076, -24.0113) -> (-8.2399, -21.7791)
  line L128 (-5.5463, -25.125) -> (-5.5463, -24.875)
  line L129 (-8.2399, -28.4709) -> (-6.0076, -26.2387)
  line L130 (5.5463, -25.125) -> (5.5463, -24.875)
  line L131 (5.5463, -24.875) -> (5.6213, -24.875)
  line L132 (5.6213, -24.875) -> (5.6213, -25.125)
  line L133 (5.6213, -25.125) -> (5.5463, -25.125)
  arc A66 (7.5858, -30.05) -> (8.2399, -28.4709) centre (7.5858, -29.125) ccw
  arc A67 (8.2929, -21.8321) -> (7.5858, -20.125) centre (7.5858, -21.125) ccw
  arc A68 (8.2399, -21.7791) -> (7.5858, -20.2) centre (7.5858, -21.125) ccw
  arc A69 (6.0076, -24.0113) -> (6.0076, -26.2387) centre (7.1213, -25.125) ccw
  arc A70 (6.0607, -24.0643) -> (6.0607, -26.1857) centre (7.1213, -25.125) ccw
  line L134 (8.2399, -21.7791) -> (6.0076, -24.0113)
  line L135 (8.2929, -21.8321) -> (6.0607, -24.0643)
  line L136 (8.2929, -28.4179) -> (6.0607, -26.1857)
  line L137 (6.0076, -26.2387) -> (8.2399, -28.4709)
  arc A71 (7.5858, -30.125) -> (8.2929, -28.4179) centre (7.5858, -29.125) ccw
  arc A72 (-19.95, 7.5858) -> (-21.5291, 8.2399) centre (-20.875, 7.5858) ccw
  arc A73 (-19.875, 7.5858) -> (-21.5821, 8.2929) centre (-20.875, 7.5858) ccw
  line L138 (-21.5821, 8.2929) -> (-23.8143, 6.0607)
  line L139 (-23.7613, 6.0076) -> (-21.5291, 8.2399)
  arc A74 (-25.9357, 6.0607) -> (-23.8143, 6.0607) centre (-24.875, 7.1213) ccw
  arc A75 (-25.9887, 6.0076) -> (-23.7613, 6.0076) centre (-24.875, 7.1213) ccw
  line L140 (-29.875, 7.5858) -> (-29.875, -7.5858)
  line L141 (-29.8, -7.5858) -> (-29.8, 7.5858)
  line L142 (-19.95, 7.5858) -> (-19.95, -7.5858)
  line L143 (-19.875, -7.5858) -> (-19.875, 7.5858)
  line L144 (-28.2209, 8.2399) -> (-25.9887, 6.0076)
  line L145 (-21.5821, -8.2929) -> (-23.8143, -6.0607)
  line L146 (-28.1679, -8.2929) -> (-25.9357, -6.0607)
  arc A76 (-29.875, -7.5858) -> (-28.1679, -8.2929) centre (-28.875, -7.5858) ccw
  arc A77 (-23.7613, -6.0076) -> (-25.9887, -6.0076) centre (-24.875, -7.1213) ccw
  line L147 (-24.875, -5.5463) -> (-24.875, -5.5463)
  line L148 (-24.875, -5.6213) -> (-24.875, -5.5463)
  line L149 (-24.875, -5.5463) -> (-24.875, -5.6213)
  line L150 (-24.875, -5.6213) -> (-24.875, -5.6213)
  arc A78 (-23.8143, -6.0607) -> (-25.9357, -6.0607) centre (-24.875, -7.1213) ccw
  line L151 (-25.9887, -6.0076) -> (-28.2209, -8.2399)
  arc A79 (-29.8, -7.5858) -> (-28.2209, -8.2399) centre (-28.875, -7.5858) ccw
  line L152 (-21.5291, -8.2399) -> (-23.7613, -6.0076)
  arc A80 (-21.5291, -8.2399) -> (-19.95, -7.5858) centre (-20.875, -7.5858) ccw
  arc A81 (-21.5821, -8.2929) -> (-19.875, -7.5858) centre (-20.875, -7.5858) ccw
  line L153 (-24.875, 5.5463) -> (-24.875, 5.5463)
  line L154 (-24.875, 5.5463) -> (-24.875, 5.6213)
  line L155 (-24.875, 5.6213) -> (-24.875, 5.5463)
  line L156 (-24.875, 5.6213) -> (-24.875, 5.6213)
  line L157 (-24.875, 0) -> (-24.875, 0)
  line L158 (-28.1679, 8.2929) -> (-25.9357, 6.0607)
  arc A82 (-28.1679, 8.2929) -> (-29.875, 7.5858) centre (-28.875, 7.5858) ccw
  arc A83 (-28.2209, 8.2399) -> (-29.8, 7.5858) centre (-28.875, 7.5858) ccw
  line L159 (25.125, -5.6213) -> (25.125, -5.5463)
  arc A84 (28.4709, -8.2399) -> (30.05, -7.5858) centre (29.125, -7.5858) ccw
  arc A85 (28.4179, -8.2929) -> (30.125, -7.5858) centre (29.125, -7.5858) ccw
  line L160 (28.4179, -8.2929) -> (26.1857, -6.0607)
  line L161 (24.875, -5.5463) -> (24.875, -5.6213)
  arc A86 (26.2387, -6.0076) -> (24.0113, -6.0076) centre (25.125, -7.1213) ccw
  line L162 (21.8321, -8.2929) -> (24.0643, -6.0607)
  line L163 (24.875, 0) -> (25.125, 0)
  arc A87 (20.2, -7.5858) -> (21.7791, -8.2399) centre (21.125, -7.5858) ccw
  arc A88 (20.125, -7.5858) -> (21.8321, -8.2929) centre (21.125, -7.5858) ccw
  line L164 (30.05, 7.5858) -> (30.05, -7.5858)
  line L165 (30.125, -7.5858) -> (30.125, 7.5858)
  line L166 (20.2, -7.5858) -> (20.2, 7.5858)
  line L167 (20.125, 7.5858) -> (20.125, -7.5858)
  line L168 (24.875, -5.6213) -> (25.125, -5.6213)
  arc A89 (26.1857, -6.0607) -> (24.0643, -6.0607) centre (25.125, -7.1213) ccw
  line L169 (24.0113, -6.0076) -> (21.7791, -8.2399)
  line L170 (25.125, -5.5463) -> (24.875, -5.5463)
  line L171 (28.4709, -8.2399) -> (26.2387, -6.0076)
  line L172 (25.125, 5.5463) -> (24.875, 5.5463)
  line L173 (24.875, 5.5463) -> (24.875, 5.6213)
  line L174 (24.875, 5.6213) -> (25.125, 5.6213)
  line L175 (25.125, 5.6213) -> (25.125, 5.5463)
  arc A90 (30.05, 7.5858) -> (28.4709, 8.2399) centre (29.125, 7.5858) ccw
  arc A91 (21.8321, 8.2929) -> (20.125, 7.5858) centre (21.125, 7.5858) ccw
  arc A92 (21.7791, 8.2399) -> (20.2, 7.5858) centre (21.125, 7.5858) ccw
  arc A93 (24.0113, 6.0076) -> (26.2387, 6.0076) centre (25.125, 7.1213) ccw
  arc A94 (24.0643, 6.0607) -> (26.1857, 6.0607) centre (25.125, 7.1213) ccw
  line L176 (21.7791, 8.2399) -> (24.0113, 6.0076)
  line L177 (21.8321, 8.2929) -> (24.0643, 6.0607)
  line L178 (28.4179, 8.2929) -> (26.1857, 6.0607)
  line L179 (26.2387, 6.0076) -> (28.4709, 8.2399)
  arc A95 (30.125, 7.5858) -> (28.4179, 8.2929) centre (29.125, 7.5858) ccw
  line L180 (-22.9, -24.875) -> (22.9, -24.875) projected
  arc A96 (22.9, -24.875) -> (24.875, -22.9) centre (22.9, -22.9) ccw projected
  line L181 (24.875, -22.9) -> (24.875, 22.9) projected
  arc A97 (24.875, 22.9) -> (22.9, 24.875) centre (22.9, 22.9) ccw projected
  line L182 (22.9, 24.875) -> (-22.9, 24.875) projected
  arc A98 (-22.9, 24.875) -> (-24.875, 22.9) centre (-22.9, 22.9) ccw projected
  line L183 (-24.875, 22.9) -> (-24.875, -22.9) projected
  arc A99 (-24.875, -22.9) -> (-22.9, -24.875) centre (-22.9, -22.9) ccw projected
  circle A100 centre (-20.8, 14.4) radius 2.0734 projected
  circle A101 centre (-20.8, -14.4) radius 2.0734 projected
  circle A102 centre (-14.4, 20.8) radius 2.0734 projected
  circle A103 centre (20.8, 14.4) radius 2.0734 projected
  circle A104 centre (20.8, -14.4) radius 2.0734 projected
  circle A105 centre (14.4, -20.8) radius 2.0734 projected
  circle A106 centre (-14.4, -20.8) radius 2.0734 projected
  circle A107 centre (14.4, 20.8) radius 2.0734 projected
  line L184 (-17.05, 17.05) -> (17.05, 17.05) projected
  line L185 (17.05, 17.05) -> (17.05, -17.05) projected
  line L186 (17.05, -17.05) -> (-17.05, -17.05) projected
  line L187 (-17.05, -17.05) -> (-17.05, 17.05) projected
  point P0 (0, 0)
  point P1 (19.875, -6.8431)
  point P2 (19.875, -10)
  point P3 (29.875, -10)
  point P4 (29.875, 10)
  point P5 (19.875, 10)
  point P6 (-30.125, 10)
  point P7 (-20.125, 10)
  point P8 (-30.125, -10)
  point P9 (-20.125, -10)
  point P10 (-30.125, -6.8431)
  point P11 (6.8431, 19.875)
  point P12 (10, 19.875)
  point P13 (10, 29.875)
  point P14 (-10, 29.875)
  point P15 (-10, 19.875)
  point P16 (-10, -30.125)
  point P17 (-10, -20.125)
  point P18 (10, -30.125)
  point P19 (10, -20.125)
  point P20 (6.8431, -30.125)
  point P21 (-19.875, 6.8431)
  point P22 (-19.875, 10)
  point P23 (-29.875, 10)
  point P24 (-29.875, -10)
  point P25 (-19.875, -10)
  point P26 (30.125, -10)
  point P27 (20.125, -10)
  point P28 (30.125, 10)
  point P29 (20.125, 10)
  point P30 (30.125, 6.8431)
  point P31 (-21, 8.5023)
  point P32 (-24.625, 5.5463)
  point P33 (-25.125, 5.5463)
  point P34 (-25.125, -5.5463)
  point P35 (-24.625, -5.5463)
  point P36 (-21, -8.5023)
  point P37 (-5.5463, 25.125)
  point P38 (5.5463, 25.125)
  dimension "d19" = 20
  dimension "d20" = 10
  dimension "d21" = 45
  dimension "d22" = 1
  dimension "d23" = 1.5
  dimension "d24" = 1
  dimension "d25" = 0.075
  dimension "d28" = 15.1716
  dimension "d29" = 2.8787
  dimension "d30" = 2.8787
  dimension "d31" = 20
  dimension "d32" = 10
  dimension "d33" = 45
  dimension "d34" = 1
  dimension "d35" = 1.5
  dimension "d36" = 1
  dimension "d37" = 0.075
  dimension "d38" = 15.1716
  dimension "d39" = 2.8787
  dimension "d40" = 2.8787
  dimension "d41" = 0.25
  dimension "d42" = 0
  dimension "d45" = 360
extrude "Extrusion2" add sketch "Sketch2" along normal up to surface (2 mm away) contours L88 A45 L95 A42 A79 L141 A83 A36 L87 A38 L86 L183 | A76 L140 A82 A36 A83 L141 A79 A42 | A42 L80 A36 A82 L140 A76
extrude "Extrusion3" cut sketch "Sketch2" along normal up to surface (2 mm away) contours A26 A86 L70 | A26 L54 A25 A87 A24 L55 A27 L70 A86 | A88 A24 A87 A25 | A25 L59 A33 A91 A32 L58 A24 A88 | A27 L55 A24 A87 L166 A92 A32 L68 A29 L181 | A88 L167 A91 A32 A92 L166 A87 A24 | A24 L58 A32 A91 L167 A88 | A29 L68 A32 A92 A33 L61 A30 A93 L64 | A33 A92 A32 A91 | A93 A30 L64
fillet "Fillet1" radius 0.25 2 edges at (-24.875, 1, -5.6213) (-24.875, 1, 5.6213)
properties part number "Interlinking Baseplate Pathed"
